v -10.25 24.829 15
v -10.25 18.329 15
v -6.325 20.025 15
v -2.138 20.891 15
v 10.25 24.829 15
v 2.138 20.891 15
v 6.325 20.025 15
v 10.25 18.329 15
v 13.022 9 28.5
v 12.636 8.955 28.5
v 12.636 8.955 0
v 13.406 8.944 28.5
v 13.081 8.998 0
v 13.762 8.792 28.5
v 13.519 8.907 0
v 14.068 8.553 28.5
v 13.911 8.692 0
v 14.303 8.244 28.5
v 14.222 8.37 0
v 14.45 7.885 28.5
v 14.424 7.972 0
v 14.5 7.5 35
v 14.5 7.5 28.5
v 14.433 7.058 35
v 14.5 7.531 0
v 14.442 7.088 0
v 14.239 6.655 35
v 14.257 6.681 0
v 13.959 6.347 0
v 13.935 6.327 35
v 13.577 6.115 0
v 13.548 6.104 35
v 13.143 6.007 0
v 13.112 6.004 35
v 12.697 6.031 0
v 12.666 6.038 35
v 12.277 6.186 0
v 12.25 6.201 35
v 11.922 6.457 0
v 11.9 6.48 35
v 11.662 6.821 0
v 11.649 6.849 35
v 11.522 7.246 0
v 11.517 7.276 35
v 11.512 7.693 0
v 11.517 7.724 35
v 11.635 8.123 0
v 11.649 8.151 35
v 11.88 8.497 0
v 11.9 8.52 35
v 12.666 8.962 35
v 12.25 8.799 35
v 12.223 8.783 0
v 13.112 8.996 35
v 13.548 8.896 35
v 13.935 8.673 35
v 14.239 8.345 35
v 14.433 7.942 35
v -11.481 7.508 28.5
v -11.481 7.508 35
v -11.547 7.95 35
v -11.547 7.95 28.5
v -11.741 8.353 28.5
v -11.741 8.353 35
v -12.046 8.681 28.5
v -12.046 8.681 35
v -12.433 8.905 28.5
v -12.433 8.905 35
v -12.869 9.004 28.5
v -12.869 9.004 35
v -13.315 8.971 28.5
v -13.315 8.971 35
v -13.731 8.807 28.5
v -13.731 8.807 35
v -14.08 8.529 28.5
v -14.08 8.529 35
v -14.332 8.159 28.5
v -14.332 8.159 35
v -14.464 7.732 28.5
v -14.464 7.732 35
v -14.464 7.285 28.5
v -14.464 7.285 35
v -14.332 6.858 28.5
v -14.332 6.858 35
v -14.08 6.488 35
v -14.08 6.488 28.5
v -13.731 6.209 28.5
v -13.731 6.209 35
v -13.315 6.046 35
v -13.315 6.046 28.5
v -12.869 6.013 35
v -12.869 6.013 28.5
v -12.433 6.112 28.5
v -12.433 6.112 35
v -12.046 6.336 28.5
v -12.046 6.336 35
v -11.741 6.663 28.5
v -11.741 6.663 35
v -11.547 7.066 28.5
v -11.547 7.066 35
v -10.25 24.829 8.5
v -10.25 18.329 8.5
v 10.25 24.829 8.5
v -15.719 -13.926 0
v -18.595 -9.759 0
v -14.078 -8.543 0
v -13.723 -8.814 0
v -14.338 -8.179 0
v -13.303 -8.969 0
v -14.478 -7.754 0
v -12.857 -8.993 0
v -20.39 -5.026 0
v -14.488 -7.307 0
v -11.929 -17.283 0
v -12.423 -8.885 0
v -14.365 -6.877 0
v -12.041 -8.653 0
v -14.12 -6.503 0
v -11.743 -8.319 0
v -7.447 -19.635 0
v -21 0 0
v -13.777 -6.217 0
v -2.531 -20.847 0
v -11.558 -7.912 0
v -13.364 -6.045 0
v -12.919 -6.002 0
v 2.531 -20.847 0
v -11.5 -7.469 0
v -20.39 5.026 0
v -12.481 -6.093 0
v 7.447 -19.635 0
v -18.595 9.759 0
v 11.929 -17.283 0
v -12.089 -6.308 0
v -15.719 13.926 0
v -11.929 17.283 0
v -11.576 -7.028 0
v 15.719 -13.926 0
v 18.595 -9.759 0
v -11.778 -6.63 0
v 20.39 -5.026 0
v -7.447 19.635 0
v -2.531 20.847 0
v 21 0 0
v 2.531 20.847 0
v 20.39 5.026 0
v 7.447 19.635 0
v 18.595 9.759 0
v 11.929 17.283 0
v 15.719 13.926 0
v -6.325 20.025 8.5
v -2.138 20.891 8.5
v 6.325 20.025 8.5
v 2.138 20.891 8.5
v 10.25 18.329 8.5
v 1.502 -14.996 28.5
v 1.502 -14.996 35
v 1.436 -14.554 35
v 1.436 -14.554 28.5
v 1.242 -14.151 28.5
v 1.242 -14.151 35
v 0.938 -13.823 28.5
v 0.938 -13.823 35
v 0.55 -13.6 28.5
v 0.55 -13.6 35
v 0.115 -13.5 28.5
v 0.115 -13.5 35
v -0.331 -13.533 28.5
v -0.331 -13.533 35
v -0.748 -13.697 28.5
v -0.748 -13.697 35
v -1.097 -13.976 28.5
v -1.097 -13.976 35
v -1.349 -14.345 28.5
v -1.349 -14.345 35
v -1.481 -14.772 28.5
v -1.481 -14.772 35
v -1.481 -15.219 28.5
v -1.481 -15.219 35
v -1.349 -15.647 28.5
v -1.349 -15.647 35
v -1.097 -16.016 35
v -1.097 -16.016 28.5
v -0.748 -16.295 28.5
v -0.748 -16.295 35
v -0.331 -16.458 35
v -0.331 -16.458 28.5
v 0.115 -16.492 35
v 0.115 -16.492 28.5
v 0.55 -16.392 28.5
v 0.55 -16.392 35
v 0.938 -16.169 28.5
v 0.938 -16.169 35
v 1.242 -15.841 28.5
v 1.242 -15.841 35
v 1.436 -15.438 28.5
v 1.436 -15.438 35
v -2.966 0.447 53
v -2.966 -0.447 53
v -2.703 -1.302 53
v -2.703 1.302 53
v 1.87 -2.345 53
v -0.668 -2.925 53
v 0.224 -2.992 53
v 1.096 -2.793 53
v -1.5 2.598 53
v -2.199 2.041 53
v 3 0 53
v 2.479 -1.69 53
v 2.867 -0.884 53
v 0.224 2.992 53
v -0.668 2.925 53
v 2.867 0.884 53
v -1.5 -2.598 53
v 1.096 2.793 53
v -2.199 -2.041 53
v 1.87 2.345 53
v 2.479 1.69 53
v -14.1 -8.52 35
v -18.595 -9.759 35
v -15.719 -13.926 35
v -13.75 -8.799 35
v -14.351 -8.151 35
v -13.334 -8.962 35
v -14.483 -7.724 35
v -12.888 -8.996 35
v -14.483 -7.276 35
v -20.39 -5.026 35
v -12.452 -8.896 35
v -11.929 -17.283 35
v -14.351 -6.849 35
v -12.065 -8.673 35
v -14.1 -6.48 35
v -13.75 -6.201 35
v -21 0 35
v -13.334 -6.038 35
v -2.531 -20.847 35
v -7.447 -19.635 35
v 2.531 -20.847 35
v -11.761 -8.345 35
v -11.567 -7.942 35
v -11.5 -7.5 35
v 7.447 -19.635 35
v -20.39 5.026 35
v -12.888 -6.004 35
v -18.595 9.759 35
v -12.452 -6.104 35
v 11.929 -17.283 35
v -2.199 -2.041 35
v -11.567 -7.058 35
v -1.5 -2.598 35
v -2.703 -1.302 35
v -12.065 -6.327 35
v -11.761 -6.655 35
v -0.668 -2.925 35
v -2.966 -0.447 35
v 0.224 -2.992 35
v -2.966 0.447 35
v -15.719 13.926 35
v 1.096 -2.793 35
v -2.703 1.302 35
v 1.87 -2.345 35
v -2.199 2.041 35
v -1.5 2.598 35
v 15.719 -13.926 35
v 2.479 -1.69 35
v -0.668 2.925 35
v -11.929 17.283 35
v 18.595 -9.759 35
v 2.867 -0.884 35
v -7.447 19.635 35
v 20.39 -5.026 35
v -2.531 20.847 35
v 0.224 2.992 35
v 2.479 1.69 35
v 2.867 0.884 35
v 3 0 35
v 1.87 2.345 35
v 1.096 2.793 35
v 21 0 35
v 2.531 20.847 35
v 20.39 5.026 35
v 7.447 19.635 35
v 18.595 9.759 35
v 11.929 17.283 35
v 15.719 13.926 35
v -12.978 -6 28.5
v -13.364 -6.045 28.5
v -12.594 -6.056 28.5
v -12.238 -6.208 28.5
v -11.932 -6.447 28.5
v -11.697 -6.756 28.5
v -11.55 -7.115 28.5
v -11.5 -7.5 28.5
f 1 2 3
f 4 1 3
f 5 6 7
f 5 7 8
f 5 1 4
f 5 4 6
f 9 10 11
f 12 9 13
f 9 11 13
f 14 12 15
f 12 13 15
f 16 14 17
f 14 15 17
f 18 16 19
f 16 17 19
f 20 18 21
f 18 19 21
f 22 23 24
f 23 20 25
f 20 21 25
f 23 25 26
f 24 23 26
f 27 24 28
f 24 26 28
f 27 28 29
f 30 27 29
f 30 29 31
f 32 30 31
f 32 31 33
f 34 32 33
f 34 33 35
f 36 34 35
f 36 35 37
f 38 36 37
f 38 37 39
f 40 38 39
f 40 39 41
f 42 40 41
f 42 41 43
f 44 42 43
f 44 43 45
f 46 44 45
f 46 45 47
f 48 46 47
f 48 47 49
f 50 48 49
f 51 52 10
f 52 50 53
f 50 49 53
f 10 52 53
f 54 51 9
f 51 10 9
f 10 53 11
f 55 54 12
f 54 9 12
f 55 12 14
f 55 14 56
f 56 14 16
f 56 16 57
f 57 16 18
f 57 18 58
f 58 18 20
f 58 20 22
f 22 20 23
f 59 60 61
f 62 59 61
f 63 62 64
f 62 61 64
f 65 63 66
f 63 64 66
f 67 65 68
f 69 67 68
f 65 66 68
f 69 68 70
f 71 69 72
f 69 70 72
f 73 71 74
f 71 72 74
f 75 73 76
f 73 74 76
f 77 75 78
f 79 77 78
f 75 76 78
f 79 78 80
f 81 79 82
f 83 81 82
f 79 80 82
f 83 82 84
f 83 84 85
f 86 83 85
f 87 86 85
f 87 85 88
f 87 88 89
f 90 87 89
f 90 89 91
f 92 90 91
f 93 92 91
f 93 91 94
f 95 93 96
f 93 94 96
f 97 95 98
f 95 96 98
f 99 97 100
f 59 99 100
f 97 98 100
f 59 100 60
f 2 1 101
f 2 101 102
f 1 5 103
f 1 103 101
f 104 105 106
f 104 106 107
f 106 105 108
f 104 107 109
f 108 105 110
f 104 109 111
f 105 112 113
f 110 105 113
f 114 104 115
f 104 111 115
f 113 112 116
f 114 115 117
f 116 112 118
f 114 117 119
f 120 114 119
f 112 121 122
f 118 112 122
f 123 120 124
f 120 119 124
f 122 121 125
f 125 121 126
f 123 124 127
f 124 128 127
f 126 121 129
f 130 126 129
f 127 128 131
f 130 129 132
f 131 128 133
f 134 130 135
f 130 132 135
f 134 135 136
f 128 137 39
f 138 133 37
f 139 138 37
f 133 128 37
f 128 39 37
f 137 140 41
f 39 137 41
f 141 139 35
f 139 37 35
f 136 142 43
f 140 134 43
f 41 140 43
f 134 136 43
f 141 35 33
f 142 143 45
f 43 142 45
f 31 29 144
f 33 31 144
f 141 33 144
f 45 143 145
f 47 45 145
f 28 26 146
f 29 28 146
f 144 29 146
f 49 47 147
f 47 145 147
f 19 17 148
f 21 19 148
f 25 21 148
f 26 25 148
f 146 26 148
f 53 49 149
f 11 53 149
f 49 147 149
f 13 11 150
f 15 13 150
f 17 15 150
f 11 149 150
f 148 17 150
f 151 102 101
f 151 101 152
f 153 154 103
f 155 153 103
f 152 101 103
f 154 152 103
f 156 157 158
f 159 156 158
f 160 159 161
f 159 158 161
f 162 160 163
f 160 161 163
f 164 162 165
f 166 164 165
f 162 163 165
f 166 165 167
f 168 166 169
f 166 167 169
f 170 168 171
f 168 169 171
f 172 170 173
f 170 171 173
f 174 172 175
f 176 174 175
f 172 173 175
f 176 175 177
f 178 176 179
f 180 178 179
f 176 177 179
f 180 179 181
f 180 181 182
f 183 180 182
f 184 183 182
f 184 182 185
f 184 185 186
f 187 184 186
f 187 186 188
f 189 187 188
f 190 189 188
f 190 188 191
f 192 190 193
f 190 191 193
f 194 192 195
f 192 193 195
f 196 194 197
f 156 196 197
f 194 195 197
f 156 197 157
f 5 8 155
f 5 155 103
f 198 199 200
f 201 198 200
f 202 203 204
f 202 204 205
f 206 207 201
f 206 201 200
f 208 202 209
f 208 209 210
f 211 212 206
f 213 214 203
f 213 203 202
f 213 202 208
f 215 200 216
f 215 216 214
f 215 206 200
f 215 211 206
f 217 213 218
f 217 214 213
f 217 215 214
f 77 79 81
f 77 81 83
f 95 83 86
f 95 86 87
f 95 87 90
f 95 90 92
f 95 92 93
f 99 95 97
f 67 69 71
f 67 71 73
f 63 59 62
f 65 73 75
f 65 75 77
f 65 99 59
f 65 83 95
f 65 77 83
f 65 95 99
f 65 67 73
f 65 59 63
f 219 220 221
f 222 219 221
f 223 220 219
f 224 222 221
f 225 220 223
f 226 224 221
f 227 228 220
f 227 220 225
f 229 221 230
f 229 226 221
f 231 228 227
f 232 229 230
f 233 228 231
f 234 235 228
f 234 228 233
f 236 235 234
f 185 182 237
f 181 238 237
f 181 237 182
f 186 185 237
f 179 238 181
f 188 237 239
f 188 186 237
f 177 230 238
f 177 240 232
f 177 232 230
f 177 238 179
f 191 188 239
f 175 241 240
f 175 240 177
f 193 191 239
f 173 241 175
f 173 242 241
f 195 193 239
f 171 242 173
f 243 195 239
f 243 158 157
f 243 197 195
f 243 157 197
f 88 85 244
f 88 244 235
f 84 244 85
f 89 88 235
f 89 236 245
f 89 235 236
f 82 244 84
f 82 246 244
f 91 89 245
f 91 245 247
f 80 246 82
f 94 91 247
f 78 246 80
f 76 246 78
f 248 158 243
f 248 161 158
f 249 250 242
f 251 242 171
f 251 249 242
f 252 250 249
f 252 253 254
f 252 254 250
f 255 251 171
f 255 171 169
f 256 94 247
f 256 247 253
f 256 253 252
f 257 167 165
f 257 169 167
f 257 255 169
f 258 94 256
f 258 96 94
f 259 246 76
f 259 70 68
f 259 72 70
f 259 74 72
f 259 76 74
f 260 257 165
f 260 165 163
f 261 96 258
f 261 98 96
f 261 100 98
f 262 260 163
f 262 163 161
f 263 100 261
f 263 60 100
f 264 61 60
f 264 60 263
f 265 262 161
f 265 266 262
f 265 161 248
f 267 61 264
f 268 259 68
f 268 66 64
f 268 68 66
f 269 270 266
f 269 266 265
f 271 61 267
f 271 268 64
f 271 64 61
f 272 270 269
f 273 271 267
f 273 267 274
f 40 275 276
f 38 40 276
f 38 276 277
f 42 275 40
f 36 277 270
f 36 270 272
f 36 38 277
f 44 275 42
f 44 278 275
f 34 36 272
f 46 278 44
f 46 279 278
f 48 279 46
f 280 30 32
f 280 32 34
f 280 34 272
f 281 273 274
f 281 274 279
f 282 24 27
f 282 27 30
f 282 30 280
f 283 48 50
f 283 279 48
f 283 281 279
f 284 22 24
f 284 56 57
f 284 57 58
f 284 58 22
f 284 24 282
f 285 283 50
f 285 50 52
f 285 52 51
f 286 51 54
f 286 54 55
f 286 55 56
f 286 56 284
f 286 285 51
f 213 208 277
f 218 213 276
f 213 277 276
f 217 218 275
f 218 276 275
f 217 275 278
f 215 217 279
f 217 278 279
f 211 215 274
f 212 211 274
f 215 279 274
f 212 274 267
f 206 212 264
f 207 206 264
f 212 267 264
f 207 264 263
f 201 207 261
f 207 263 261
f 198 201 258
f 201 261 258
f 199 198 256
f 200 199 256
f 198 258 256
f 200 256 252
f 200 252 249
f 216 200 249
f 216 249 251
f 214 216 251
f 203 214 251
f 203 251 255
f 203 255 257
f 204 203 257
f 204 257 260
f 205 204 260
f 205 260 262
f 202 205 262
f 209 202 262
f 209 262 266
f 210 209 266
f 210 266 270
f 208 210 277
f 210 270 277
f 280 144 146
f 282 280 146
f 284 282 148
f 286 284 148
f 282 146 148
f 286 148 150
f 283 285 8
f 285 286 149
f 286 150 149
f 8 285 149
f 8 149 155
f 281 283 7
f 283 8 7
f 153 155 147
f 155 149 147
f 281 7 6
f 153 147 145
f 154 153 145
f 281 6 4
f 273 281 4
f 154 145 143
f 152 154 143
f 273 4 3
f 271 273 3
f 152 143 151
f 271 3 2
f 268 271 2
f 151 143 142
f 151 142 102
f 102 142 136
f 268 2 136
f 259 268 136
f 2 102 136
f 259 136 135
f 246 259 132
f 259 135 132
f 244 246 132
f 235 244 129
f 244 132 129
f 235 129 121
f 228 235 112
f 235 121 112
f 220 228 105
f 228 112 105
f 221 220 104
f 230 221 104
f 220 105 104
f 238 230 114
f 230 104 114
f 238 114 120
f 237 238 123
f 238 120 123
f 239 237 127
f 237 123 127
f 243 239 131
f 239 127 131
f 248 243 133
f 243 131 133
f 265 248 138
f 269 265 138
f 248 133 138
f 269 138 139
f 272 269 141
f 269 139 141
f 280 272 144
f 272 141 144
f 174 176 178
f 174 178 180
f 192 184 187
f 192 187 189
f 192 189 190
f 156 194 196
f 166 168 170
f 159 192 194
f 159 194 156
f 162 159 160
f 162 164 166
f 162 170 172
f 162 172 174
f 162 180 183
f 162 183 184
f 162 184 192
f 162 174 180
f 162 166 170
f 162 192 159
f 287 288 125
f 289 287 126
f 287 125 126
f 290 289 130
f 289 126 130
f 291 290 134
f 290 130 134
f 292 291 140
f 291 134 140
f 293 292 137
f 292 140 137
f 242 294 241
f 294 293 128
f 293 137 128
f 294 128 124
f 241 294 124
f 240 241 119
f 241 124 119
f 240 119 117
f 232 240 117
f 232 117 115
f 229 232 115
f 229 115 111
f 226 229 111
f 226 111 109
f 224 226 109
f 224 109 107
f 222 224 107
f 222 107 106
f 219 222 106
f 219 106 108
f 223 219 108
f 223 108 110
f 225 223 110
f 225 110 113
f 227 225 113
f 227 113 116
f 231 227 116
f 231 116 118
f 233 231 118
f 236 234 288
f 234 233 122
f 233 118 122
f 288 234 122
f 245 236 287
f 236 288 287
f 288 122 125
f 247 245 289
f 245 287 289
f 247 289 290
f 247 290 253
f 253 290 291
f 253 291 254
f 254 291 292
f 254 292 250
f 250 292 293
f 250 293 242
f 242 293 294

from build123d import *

# Parameters (mm, degrees)
SKETCH_1_R          = 21
EXTRUDE_1_DEPTH     = 35
SKETCH_2_R          = 3
EXTRUDE_2_DEPTH     = 18
EXTRUDE_4_DEPTH     = 6.5
SKETCH_7_R          = 1.5
CUT_EXTRUDE_1_DEPTH = 6.5
MM_PRESS_1_D        = 3
MM_PRESS_2_D        = 3


with BuildPart() as part:
    # 草图1 → 凸台-拉伸1 (new body)
    with BuildSketch(Plane.XY):
        Circle(SKETCH_1_R)
    extrude(amount=EXTRUDE_1_DEPTH)

    # 草图2 → 凸台-拉伸2 (add)
    with BuildSketch(Plane.XY.offset(35)):
        Circle(SKETCH_2_R)
    extrude(amount=EXTRUDE_2_DEPTH)

    # 草图6 → 凸台-拉伸4 (add)
    with BuildSketch(Plane(origin=(0, 0, 15), x_dir=(-1, 0, 0), z_dir=(0, 0, -1))):
        with BuildLine():
            Line((-10.25, 18.328597873), (-10.25, 24.828597873))
            Line((-10.25, 24.828597873), (10.25, 24.828597873))
            Line((10.25, 24.828597873), (10.25, 18.328597873))
            ThreePointArc((10.25, 18.328597873), (0, 21), (-10.25, 18.328597873))
        make_face()
    extrude(amount=EXTRUDE_4_DEPTH)

    # 草图7 → 切除-拉伸1 (cut)
    with BuildSketch(Plane.XY.offset(35)):
        with Locations((13, 7.5)):
            Circle(SKETCH_7_R)
        with Locations((0.002409407, -14.995836032)):
            Circle(SKETCH_7_R)
        with Locations((-12.98076078, 7.508325625)):
            Circle(SKETCH_7_R)
        with Locations((-13, -7.5)):
            Circle(SKETCH_7_R)
    extrude(amount=-CUT_EXTRUDE_1_DEPTH, mode=Mode.SUBTRACT)

    # 大小mm Press 暗销孔1 (through all)
    with Locations(Plane(origin=(19.777789767, 155.433675327, 28.5), x_dir=(0.242616345, -0.970122317, 0), z_dir=(0, 0, 1))):
        with Locations((141.869357239, -42.466412685)):
            Hole(MM_PRESS_1_D / 2)

    # 大小mm Press 暗销孔2 (through all)
    with Locations(Plane(origin=(19.777789767, 155.433675327, 28.5), x_dir=(0.242616345, -0.970122317, 0), z_dir=(0, 0, 1))):
        with Locations((150.113167025, -71.32883809)):
            Hole(MM_PRESS_2_D / 2)


solid = part.part
